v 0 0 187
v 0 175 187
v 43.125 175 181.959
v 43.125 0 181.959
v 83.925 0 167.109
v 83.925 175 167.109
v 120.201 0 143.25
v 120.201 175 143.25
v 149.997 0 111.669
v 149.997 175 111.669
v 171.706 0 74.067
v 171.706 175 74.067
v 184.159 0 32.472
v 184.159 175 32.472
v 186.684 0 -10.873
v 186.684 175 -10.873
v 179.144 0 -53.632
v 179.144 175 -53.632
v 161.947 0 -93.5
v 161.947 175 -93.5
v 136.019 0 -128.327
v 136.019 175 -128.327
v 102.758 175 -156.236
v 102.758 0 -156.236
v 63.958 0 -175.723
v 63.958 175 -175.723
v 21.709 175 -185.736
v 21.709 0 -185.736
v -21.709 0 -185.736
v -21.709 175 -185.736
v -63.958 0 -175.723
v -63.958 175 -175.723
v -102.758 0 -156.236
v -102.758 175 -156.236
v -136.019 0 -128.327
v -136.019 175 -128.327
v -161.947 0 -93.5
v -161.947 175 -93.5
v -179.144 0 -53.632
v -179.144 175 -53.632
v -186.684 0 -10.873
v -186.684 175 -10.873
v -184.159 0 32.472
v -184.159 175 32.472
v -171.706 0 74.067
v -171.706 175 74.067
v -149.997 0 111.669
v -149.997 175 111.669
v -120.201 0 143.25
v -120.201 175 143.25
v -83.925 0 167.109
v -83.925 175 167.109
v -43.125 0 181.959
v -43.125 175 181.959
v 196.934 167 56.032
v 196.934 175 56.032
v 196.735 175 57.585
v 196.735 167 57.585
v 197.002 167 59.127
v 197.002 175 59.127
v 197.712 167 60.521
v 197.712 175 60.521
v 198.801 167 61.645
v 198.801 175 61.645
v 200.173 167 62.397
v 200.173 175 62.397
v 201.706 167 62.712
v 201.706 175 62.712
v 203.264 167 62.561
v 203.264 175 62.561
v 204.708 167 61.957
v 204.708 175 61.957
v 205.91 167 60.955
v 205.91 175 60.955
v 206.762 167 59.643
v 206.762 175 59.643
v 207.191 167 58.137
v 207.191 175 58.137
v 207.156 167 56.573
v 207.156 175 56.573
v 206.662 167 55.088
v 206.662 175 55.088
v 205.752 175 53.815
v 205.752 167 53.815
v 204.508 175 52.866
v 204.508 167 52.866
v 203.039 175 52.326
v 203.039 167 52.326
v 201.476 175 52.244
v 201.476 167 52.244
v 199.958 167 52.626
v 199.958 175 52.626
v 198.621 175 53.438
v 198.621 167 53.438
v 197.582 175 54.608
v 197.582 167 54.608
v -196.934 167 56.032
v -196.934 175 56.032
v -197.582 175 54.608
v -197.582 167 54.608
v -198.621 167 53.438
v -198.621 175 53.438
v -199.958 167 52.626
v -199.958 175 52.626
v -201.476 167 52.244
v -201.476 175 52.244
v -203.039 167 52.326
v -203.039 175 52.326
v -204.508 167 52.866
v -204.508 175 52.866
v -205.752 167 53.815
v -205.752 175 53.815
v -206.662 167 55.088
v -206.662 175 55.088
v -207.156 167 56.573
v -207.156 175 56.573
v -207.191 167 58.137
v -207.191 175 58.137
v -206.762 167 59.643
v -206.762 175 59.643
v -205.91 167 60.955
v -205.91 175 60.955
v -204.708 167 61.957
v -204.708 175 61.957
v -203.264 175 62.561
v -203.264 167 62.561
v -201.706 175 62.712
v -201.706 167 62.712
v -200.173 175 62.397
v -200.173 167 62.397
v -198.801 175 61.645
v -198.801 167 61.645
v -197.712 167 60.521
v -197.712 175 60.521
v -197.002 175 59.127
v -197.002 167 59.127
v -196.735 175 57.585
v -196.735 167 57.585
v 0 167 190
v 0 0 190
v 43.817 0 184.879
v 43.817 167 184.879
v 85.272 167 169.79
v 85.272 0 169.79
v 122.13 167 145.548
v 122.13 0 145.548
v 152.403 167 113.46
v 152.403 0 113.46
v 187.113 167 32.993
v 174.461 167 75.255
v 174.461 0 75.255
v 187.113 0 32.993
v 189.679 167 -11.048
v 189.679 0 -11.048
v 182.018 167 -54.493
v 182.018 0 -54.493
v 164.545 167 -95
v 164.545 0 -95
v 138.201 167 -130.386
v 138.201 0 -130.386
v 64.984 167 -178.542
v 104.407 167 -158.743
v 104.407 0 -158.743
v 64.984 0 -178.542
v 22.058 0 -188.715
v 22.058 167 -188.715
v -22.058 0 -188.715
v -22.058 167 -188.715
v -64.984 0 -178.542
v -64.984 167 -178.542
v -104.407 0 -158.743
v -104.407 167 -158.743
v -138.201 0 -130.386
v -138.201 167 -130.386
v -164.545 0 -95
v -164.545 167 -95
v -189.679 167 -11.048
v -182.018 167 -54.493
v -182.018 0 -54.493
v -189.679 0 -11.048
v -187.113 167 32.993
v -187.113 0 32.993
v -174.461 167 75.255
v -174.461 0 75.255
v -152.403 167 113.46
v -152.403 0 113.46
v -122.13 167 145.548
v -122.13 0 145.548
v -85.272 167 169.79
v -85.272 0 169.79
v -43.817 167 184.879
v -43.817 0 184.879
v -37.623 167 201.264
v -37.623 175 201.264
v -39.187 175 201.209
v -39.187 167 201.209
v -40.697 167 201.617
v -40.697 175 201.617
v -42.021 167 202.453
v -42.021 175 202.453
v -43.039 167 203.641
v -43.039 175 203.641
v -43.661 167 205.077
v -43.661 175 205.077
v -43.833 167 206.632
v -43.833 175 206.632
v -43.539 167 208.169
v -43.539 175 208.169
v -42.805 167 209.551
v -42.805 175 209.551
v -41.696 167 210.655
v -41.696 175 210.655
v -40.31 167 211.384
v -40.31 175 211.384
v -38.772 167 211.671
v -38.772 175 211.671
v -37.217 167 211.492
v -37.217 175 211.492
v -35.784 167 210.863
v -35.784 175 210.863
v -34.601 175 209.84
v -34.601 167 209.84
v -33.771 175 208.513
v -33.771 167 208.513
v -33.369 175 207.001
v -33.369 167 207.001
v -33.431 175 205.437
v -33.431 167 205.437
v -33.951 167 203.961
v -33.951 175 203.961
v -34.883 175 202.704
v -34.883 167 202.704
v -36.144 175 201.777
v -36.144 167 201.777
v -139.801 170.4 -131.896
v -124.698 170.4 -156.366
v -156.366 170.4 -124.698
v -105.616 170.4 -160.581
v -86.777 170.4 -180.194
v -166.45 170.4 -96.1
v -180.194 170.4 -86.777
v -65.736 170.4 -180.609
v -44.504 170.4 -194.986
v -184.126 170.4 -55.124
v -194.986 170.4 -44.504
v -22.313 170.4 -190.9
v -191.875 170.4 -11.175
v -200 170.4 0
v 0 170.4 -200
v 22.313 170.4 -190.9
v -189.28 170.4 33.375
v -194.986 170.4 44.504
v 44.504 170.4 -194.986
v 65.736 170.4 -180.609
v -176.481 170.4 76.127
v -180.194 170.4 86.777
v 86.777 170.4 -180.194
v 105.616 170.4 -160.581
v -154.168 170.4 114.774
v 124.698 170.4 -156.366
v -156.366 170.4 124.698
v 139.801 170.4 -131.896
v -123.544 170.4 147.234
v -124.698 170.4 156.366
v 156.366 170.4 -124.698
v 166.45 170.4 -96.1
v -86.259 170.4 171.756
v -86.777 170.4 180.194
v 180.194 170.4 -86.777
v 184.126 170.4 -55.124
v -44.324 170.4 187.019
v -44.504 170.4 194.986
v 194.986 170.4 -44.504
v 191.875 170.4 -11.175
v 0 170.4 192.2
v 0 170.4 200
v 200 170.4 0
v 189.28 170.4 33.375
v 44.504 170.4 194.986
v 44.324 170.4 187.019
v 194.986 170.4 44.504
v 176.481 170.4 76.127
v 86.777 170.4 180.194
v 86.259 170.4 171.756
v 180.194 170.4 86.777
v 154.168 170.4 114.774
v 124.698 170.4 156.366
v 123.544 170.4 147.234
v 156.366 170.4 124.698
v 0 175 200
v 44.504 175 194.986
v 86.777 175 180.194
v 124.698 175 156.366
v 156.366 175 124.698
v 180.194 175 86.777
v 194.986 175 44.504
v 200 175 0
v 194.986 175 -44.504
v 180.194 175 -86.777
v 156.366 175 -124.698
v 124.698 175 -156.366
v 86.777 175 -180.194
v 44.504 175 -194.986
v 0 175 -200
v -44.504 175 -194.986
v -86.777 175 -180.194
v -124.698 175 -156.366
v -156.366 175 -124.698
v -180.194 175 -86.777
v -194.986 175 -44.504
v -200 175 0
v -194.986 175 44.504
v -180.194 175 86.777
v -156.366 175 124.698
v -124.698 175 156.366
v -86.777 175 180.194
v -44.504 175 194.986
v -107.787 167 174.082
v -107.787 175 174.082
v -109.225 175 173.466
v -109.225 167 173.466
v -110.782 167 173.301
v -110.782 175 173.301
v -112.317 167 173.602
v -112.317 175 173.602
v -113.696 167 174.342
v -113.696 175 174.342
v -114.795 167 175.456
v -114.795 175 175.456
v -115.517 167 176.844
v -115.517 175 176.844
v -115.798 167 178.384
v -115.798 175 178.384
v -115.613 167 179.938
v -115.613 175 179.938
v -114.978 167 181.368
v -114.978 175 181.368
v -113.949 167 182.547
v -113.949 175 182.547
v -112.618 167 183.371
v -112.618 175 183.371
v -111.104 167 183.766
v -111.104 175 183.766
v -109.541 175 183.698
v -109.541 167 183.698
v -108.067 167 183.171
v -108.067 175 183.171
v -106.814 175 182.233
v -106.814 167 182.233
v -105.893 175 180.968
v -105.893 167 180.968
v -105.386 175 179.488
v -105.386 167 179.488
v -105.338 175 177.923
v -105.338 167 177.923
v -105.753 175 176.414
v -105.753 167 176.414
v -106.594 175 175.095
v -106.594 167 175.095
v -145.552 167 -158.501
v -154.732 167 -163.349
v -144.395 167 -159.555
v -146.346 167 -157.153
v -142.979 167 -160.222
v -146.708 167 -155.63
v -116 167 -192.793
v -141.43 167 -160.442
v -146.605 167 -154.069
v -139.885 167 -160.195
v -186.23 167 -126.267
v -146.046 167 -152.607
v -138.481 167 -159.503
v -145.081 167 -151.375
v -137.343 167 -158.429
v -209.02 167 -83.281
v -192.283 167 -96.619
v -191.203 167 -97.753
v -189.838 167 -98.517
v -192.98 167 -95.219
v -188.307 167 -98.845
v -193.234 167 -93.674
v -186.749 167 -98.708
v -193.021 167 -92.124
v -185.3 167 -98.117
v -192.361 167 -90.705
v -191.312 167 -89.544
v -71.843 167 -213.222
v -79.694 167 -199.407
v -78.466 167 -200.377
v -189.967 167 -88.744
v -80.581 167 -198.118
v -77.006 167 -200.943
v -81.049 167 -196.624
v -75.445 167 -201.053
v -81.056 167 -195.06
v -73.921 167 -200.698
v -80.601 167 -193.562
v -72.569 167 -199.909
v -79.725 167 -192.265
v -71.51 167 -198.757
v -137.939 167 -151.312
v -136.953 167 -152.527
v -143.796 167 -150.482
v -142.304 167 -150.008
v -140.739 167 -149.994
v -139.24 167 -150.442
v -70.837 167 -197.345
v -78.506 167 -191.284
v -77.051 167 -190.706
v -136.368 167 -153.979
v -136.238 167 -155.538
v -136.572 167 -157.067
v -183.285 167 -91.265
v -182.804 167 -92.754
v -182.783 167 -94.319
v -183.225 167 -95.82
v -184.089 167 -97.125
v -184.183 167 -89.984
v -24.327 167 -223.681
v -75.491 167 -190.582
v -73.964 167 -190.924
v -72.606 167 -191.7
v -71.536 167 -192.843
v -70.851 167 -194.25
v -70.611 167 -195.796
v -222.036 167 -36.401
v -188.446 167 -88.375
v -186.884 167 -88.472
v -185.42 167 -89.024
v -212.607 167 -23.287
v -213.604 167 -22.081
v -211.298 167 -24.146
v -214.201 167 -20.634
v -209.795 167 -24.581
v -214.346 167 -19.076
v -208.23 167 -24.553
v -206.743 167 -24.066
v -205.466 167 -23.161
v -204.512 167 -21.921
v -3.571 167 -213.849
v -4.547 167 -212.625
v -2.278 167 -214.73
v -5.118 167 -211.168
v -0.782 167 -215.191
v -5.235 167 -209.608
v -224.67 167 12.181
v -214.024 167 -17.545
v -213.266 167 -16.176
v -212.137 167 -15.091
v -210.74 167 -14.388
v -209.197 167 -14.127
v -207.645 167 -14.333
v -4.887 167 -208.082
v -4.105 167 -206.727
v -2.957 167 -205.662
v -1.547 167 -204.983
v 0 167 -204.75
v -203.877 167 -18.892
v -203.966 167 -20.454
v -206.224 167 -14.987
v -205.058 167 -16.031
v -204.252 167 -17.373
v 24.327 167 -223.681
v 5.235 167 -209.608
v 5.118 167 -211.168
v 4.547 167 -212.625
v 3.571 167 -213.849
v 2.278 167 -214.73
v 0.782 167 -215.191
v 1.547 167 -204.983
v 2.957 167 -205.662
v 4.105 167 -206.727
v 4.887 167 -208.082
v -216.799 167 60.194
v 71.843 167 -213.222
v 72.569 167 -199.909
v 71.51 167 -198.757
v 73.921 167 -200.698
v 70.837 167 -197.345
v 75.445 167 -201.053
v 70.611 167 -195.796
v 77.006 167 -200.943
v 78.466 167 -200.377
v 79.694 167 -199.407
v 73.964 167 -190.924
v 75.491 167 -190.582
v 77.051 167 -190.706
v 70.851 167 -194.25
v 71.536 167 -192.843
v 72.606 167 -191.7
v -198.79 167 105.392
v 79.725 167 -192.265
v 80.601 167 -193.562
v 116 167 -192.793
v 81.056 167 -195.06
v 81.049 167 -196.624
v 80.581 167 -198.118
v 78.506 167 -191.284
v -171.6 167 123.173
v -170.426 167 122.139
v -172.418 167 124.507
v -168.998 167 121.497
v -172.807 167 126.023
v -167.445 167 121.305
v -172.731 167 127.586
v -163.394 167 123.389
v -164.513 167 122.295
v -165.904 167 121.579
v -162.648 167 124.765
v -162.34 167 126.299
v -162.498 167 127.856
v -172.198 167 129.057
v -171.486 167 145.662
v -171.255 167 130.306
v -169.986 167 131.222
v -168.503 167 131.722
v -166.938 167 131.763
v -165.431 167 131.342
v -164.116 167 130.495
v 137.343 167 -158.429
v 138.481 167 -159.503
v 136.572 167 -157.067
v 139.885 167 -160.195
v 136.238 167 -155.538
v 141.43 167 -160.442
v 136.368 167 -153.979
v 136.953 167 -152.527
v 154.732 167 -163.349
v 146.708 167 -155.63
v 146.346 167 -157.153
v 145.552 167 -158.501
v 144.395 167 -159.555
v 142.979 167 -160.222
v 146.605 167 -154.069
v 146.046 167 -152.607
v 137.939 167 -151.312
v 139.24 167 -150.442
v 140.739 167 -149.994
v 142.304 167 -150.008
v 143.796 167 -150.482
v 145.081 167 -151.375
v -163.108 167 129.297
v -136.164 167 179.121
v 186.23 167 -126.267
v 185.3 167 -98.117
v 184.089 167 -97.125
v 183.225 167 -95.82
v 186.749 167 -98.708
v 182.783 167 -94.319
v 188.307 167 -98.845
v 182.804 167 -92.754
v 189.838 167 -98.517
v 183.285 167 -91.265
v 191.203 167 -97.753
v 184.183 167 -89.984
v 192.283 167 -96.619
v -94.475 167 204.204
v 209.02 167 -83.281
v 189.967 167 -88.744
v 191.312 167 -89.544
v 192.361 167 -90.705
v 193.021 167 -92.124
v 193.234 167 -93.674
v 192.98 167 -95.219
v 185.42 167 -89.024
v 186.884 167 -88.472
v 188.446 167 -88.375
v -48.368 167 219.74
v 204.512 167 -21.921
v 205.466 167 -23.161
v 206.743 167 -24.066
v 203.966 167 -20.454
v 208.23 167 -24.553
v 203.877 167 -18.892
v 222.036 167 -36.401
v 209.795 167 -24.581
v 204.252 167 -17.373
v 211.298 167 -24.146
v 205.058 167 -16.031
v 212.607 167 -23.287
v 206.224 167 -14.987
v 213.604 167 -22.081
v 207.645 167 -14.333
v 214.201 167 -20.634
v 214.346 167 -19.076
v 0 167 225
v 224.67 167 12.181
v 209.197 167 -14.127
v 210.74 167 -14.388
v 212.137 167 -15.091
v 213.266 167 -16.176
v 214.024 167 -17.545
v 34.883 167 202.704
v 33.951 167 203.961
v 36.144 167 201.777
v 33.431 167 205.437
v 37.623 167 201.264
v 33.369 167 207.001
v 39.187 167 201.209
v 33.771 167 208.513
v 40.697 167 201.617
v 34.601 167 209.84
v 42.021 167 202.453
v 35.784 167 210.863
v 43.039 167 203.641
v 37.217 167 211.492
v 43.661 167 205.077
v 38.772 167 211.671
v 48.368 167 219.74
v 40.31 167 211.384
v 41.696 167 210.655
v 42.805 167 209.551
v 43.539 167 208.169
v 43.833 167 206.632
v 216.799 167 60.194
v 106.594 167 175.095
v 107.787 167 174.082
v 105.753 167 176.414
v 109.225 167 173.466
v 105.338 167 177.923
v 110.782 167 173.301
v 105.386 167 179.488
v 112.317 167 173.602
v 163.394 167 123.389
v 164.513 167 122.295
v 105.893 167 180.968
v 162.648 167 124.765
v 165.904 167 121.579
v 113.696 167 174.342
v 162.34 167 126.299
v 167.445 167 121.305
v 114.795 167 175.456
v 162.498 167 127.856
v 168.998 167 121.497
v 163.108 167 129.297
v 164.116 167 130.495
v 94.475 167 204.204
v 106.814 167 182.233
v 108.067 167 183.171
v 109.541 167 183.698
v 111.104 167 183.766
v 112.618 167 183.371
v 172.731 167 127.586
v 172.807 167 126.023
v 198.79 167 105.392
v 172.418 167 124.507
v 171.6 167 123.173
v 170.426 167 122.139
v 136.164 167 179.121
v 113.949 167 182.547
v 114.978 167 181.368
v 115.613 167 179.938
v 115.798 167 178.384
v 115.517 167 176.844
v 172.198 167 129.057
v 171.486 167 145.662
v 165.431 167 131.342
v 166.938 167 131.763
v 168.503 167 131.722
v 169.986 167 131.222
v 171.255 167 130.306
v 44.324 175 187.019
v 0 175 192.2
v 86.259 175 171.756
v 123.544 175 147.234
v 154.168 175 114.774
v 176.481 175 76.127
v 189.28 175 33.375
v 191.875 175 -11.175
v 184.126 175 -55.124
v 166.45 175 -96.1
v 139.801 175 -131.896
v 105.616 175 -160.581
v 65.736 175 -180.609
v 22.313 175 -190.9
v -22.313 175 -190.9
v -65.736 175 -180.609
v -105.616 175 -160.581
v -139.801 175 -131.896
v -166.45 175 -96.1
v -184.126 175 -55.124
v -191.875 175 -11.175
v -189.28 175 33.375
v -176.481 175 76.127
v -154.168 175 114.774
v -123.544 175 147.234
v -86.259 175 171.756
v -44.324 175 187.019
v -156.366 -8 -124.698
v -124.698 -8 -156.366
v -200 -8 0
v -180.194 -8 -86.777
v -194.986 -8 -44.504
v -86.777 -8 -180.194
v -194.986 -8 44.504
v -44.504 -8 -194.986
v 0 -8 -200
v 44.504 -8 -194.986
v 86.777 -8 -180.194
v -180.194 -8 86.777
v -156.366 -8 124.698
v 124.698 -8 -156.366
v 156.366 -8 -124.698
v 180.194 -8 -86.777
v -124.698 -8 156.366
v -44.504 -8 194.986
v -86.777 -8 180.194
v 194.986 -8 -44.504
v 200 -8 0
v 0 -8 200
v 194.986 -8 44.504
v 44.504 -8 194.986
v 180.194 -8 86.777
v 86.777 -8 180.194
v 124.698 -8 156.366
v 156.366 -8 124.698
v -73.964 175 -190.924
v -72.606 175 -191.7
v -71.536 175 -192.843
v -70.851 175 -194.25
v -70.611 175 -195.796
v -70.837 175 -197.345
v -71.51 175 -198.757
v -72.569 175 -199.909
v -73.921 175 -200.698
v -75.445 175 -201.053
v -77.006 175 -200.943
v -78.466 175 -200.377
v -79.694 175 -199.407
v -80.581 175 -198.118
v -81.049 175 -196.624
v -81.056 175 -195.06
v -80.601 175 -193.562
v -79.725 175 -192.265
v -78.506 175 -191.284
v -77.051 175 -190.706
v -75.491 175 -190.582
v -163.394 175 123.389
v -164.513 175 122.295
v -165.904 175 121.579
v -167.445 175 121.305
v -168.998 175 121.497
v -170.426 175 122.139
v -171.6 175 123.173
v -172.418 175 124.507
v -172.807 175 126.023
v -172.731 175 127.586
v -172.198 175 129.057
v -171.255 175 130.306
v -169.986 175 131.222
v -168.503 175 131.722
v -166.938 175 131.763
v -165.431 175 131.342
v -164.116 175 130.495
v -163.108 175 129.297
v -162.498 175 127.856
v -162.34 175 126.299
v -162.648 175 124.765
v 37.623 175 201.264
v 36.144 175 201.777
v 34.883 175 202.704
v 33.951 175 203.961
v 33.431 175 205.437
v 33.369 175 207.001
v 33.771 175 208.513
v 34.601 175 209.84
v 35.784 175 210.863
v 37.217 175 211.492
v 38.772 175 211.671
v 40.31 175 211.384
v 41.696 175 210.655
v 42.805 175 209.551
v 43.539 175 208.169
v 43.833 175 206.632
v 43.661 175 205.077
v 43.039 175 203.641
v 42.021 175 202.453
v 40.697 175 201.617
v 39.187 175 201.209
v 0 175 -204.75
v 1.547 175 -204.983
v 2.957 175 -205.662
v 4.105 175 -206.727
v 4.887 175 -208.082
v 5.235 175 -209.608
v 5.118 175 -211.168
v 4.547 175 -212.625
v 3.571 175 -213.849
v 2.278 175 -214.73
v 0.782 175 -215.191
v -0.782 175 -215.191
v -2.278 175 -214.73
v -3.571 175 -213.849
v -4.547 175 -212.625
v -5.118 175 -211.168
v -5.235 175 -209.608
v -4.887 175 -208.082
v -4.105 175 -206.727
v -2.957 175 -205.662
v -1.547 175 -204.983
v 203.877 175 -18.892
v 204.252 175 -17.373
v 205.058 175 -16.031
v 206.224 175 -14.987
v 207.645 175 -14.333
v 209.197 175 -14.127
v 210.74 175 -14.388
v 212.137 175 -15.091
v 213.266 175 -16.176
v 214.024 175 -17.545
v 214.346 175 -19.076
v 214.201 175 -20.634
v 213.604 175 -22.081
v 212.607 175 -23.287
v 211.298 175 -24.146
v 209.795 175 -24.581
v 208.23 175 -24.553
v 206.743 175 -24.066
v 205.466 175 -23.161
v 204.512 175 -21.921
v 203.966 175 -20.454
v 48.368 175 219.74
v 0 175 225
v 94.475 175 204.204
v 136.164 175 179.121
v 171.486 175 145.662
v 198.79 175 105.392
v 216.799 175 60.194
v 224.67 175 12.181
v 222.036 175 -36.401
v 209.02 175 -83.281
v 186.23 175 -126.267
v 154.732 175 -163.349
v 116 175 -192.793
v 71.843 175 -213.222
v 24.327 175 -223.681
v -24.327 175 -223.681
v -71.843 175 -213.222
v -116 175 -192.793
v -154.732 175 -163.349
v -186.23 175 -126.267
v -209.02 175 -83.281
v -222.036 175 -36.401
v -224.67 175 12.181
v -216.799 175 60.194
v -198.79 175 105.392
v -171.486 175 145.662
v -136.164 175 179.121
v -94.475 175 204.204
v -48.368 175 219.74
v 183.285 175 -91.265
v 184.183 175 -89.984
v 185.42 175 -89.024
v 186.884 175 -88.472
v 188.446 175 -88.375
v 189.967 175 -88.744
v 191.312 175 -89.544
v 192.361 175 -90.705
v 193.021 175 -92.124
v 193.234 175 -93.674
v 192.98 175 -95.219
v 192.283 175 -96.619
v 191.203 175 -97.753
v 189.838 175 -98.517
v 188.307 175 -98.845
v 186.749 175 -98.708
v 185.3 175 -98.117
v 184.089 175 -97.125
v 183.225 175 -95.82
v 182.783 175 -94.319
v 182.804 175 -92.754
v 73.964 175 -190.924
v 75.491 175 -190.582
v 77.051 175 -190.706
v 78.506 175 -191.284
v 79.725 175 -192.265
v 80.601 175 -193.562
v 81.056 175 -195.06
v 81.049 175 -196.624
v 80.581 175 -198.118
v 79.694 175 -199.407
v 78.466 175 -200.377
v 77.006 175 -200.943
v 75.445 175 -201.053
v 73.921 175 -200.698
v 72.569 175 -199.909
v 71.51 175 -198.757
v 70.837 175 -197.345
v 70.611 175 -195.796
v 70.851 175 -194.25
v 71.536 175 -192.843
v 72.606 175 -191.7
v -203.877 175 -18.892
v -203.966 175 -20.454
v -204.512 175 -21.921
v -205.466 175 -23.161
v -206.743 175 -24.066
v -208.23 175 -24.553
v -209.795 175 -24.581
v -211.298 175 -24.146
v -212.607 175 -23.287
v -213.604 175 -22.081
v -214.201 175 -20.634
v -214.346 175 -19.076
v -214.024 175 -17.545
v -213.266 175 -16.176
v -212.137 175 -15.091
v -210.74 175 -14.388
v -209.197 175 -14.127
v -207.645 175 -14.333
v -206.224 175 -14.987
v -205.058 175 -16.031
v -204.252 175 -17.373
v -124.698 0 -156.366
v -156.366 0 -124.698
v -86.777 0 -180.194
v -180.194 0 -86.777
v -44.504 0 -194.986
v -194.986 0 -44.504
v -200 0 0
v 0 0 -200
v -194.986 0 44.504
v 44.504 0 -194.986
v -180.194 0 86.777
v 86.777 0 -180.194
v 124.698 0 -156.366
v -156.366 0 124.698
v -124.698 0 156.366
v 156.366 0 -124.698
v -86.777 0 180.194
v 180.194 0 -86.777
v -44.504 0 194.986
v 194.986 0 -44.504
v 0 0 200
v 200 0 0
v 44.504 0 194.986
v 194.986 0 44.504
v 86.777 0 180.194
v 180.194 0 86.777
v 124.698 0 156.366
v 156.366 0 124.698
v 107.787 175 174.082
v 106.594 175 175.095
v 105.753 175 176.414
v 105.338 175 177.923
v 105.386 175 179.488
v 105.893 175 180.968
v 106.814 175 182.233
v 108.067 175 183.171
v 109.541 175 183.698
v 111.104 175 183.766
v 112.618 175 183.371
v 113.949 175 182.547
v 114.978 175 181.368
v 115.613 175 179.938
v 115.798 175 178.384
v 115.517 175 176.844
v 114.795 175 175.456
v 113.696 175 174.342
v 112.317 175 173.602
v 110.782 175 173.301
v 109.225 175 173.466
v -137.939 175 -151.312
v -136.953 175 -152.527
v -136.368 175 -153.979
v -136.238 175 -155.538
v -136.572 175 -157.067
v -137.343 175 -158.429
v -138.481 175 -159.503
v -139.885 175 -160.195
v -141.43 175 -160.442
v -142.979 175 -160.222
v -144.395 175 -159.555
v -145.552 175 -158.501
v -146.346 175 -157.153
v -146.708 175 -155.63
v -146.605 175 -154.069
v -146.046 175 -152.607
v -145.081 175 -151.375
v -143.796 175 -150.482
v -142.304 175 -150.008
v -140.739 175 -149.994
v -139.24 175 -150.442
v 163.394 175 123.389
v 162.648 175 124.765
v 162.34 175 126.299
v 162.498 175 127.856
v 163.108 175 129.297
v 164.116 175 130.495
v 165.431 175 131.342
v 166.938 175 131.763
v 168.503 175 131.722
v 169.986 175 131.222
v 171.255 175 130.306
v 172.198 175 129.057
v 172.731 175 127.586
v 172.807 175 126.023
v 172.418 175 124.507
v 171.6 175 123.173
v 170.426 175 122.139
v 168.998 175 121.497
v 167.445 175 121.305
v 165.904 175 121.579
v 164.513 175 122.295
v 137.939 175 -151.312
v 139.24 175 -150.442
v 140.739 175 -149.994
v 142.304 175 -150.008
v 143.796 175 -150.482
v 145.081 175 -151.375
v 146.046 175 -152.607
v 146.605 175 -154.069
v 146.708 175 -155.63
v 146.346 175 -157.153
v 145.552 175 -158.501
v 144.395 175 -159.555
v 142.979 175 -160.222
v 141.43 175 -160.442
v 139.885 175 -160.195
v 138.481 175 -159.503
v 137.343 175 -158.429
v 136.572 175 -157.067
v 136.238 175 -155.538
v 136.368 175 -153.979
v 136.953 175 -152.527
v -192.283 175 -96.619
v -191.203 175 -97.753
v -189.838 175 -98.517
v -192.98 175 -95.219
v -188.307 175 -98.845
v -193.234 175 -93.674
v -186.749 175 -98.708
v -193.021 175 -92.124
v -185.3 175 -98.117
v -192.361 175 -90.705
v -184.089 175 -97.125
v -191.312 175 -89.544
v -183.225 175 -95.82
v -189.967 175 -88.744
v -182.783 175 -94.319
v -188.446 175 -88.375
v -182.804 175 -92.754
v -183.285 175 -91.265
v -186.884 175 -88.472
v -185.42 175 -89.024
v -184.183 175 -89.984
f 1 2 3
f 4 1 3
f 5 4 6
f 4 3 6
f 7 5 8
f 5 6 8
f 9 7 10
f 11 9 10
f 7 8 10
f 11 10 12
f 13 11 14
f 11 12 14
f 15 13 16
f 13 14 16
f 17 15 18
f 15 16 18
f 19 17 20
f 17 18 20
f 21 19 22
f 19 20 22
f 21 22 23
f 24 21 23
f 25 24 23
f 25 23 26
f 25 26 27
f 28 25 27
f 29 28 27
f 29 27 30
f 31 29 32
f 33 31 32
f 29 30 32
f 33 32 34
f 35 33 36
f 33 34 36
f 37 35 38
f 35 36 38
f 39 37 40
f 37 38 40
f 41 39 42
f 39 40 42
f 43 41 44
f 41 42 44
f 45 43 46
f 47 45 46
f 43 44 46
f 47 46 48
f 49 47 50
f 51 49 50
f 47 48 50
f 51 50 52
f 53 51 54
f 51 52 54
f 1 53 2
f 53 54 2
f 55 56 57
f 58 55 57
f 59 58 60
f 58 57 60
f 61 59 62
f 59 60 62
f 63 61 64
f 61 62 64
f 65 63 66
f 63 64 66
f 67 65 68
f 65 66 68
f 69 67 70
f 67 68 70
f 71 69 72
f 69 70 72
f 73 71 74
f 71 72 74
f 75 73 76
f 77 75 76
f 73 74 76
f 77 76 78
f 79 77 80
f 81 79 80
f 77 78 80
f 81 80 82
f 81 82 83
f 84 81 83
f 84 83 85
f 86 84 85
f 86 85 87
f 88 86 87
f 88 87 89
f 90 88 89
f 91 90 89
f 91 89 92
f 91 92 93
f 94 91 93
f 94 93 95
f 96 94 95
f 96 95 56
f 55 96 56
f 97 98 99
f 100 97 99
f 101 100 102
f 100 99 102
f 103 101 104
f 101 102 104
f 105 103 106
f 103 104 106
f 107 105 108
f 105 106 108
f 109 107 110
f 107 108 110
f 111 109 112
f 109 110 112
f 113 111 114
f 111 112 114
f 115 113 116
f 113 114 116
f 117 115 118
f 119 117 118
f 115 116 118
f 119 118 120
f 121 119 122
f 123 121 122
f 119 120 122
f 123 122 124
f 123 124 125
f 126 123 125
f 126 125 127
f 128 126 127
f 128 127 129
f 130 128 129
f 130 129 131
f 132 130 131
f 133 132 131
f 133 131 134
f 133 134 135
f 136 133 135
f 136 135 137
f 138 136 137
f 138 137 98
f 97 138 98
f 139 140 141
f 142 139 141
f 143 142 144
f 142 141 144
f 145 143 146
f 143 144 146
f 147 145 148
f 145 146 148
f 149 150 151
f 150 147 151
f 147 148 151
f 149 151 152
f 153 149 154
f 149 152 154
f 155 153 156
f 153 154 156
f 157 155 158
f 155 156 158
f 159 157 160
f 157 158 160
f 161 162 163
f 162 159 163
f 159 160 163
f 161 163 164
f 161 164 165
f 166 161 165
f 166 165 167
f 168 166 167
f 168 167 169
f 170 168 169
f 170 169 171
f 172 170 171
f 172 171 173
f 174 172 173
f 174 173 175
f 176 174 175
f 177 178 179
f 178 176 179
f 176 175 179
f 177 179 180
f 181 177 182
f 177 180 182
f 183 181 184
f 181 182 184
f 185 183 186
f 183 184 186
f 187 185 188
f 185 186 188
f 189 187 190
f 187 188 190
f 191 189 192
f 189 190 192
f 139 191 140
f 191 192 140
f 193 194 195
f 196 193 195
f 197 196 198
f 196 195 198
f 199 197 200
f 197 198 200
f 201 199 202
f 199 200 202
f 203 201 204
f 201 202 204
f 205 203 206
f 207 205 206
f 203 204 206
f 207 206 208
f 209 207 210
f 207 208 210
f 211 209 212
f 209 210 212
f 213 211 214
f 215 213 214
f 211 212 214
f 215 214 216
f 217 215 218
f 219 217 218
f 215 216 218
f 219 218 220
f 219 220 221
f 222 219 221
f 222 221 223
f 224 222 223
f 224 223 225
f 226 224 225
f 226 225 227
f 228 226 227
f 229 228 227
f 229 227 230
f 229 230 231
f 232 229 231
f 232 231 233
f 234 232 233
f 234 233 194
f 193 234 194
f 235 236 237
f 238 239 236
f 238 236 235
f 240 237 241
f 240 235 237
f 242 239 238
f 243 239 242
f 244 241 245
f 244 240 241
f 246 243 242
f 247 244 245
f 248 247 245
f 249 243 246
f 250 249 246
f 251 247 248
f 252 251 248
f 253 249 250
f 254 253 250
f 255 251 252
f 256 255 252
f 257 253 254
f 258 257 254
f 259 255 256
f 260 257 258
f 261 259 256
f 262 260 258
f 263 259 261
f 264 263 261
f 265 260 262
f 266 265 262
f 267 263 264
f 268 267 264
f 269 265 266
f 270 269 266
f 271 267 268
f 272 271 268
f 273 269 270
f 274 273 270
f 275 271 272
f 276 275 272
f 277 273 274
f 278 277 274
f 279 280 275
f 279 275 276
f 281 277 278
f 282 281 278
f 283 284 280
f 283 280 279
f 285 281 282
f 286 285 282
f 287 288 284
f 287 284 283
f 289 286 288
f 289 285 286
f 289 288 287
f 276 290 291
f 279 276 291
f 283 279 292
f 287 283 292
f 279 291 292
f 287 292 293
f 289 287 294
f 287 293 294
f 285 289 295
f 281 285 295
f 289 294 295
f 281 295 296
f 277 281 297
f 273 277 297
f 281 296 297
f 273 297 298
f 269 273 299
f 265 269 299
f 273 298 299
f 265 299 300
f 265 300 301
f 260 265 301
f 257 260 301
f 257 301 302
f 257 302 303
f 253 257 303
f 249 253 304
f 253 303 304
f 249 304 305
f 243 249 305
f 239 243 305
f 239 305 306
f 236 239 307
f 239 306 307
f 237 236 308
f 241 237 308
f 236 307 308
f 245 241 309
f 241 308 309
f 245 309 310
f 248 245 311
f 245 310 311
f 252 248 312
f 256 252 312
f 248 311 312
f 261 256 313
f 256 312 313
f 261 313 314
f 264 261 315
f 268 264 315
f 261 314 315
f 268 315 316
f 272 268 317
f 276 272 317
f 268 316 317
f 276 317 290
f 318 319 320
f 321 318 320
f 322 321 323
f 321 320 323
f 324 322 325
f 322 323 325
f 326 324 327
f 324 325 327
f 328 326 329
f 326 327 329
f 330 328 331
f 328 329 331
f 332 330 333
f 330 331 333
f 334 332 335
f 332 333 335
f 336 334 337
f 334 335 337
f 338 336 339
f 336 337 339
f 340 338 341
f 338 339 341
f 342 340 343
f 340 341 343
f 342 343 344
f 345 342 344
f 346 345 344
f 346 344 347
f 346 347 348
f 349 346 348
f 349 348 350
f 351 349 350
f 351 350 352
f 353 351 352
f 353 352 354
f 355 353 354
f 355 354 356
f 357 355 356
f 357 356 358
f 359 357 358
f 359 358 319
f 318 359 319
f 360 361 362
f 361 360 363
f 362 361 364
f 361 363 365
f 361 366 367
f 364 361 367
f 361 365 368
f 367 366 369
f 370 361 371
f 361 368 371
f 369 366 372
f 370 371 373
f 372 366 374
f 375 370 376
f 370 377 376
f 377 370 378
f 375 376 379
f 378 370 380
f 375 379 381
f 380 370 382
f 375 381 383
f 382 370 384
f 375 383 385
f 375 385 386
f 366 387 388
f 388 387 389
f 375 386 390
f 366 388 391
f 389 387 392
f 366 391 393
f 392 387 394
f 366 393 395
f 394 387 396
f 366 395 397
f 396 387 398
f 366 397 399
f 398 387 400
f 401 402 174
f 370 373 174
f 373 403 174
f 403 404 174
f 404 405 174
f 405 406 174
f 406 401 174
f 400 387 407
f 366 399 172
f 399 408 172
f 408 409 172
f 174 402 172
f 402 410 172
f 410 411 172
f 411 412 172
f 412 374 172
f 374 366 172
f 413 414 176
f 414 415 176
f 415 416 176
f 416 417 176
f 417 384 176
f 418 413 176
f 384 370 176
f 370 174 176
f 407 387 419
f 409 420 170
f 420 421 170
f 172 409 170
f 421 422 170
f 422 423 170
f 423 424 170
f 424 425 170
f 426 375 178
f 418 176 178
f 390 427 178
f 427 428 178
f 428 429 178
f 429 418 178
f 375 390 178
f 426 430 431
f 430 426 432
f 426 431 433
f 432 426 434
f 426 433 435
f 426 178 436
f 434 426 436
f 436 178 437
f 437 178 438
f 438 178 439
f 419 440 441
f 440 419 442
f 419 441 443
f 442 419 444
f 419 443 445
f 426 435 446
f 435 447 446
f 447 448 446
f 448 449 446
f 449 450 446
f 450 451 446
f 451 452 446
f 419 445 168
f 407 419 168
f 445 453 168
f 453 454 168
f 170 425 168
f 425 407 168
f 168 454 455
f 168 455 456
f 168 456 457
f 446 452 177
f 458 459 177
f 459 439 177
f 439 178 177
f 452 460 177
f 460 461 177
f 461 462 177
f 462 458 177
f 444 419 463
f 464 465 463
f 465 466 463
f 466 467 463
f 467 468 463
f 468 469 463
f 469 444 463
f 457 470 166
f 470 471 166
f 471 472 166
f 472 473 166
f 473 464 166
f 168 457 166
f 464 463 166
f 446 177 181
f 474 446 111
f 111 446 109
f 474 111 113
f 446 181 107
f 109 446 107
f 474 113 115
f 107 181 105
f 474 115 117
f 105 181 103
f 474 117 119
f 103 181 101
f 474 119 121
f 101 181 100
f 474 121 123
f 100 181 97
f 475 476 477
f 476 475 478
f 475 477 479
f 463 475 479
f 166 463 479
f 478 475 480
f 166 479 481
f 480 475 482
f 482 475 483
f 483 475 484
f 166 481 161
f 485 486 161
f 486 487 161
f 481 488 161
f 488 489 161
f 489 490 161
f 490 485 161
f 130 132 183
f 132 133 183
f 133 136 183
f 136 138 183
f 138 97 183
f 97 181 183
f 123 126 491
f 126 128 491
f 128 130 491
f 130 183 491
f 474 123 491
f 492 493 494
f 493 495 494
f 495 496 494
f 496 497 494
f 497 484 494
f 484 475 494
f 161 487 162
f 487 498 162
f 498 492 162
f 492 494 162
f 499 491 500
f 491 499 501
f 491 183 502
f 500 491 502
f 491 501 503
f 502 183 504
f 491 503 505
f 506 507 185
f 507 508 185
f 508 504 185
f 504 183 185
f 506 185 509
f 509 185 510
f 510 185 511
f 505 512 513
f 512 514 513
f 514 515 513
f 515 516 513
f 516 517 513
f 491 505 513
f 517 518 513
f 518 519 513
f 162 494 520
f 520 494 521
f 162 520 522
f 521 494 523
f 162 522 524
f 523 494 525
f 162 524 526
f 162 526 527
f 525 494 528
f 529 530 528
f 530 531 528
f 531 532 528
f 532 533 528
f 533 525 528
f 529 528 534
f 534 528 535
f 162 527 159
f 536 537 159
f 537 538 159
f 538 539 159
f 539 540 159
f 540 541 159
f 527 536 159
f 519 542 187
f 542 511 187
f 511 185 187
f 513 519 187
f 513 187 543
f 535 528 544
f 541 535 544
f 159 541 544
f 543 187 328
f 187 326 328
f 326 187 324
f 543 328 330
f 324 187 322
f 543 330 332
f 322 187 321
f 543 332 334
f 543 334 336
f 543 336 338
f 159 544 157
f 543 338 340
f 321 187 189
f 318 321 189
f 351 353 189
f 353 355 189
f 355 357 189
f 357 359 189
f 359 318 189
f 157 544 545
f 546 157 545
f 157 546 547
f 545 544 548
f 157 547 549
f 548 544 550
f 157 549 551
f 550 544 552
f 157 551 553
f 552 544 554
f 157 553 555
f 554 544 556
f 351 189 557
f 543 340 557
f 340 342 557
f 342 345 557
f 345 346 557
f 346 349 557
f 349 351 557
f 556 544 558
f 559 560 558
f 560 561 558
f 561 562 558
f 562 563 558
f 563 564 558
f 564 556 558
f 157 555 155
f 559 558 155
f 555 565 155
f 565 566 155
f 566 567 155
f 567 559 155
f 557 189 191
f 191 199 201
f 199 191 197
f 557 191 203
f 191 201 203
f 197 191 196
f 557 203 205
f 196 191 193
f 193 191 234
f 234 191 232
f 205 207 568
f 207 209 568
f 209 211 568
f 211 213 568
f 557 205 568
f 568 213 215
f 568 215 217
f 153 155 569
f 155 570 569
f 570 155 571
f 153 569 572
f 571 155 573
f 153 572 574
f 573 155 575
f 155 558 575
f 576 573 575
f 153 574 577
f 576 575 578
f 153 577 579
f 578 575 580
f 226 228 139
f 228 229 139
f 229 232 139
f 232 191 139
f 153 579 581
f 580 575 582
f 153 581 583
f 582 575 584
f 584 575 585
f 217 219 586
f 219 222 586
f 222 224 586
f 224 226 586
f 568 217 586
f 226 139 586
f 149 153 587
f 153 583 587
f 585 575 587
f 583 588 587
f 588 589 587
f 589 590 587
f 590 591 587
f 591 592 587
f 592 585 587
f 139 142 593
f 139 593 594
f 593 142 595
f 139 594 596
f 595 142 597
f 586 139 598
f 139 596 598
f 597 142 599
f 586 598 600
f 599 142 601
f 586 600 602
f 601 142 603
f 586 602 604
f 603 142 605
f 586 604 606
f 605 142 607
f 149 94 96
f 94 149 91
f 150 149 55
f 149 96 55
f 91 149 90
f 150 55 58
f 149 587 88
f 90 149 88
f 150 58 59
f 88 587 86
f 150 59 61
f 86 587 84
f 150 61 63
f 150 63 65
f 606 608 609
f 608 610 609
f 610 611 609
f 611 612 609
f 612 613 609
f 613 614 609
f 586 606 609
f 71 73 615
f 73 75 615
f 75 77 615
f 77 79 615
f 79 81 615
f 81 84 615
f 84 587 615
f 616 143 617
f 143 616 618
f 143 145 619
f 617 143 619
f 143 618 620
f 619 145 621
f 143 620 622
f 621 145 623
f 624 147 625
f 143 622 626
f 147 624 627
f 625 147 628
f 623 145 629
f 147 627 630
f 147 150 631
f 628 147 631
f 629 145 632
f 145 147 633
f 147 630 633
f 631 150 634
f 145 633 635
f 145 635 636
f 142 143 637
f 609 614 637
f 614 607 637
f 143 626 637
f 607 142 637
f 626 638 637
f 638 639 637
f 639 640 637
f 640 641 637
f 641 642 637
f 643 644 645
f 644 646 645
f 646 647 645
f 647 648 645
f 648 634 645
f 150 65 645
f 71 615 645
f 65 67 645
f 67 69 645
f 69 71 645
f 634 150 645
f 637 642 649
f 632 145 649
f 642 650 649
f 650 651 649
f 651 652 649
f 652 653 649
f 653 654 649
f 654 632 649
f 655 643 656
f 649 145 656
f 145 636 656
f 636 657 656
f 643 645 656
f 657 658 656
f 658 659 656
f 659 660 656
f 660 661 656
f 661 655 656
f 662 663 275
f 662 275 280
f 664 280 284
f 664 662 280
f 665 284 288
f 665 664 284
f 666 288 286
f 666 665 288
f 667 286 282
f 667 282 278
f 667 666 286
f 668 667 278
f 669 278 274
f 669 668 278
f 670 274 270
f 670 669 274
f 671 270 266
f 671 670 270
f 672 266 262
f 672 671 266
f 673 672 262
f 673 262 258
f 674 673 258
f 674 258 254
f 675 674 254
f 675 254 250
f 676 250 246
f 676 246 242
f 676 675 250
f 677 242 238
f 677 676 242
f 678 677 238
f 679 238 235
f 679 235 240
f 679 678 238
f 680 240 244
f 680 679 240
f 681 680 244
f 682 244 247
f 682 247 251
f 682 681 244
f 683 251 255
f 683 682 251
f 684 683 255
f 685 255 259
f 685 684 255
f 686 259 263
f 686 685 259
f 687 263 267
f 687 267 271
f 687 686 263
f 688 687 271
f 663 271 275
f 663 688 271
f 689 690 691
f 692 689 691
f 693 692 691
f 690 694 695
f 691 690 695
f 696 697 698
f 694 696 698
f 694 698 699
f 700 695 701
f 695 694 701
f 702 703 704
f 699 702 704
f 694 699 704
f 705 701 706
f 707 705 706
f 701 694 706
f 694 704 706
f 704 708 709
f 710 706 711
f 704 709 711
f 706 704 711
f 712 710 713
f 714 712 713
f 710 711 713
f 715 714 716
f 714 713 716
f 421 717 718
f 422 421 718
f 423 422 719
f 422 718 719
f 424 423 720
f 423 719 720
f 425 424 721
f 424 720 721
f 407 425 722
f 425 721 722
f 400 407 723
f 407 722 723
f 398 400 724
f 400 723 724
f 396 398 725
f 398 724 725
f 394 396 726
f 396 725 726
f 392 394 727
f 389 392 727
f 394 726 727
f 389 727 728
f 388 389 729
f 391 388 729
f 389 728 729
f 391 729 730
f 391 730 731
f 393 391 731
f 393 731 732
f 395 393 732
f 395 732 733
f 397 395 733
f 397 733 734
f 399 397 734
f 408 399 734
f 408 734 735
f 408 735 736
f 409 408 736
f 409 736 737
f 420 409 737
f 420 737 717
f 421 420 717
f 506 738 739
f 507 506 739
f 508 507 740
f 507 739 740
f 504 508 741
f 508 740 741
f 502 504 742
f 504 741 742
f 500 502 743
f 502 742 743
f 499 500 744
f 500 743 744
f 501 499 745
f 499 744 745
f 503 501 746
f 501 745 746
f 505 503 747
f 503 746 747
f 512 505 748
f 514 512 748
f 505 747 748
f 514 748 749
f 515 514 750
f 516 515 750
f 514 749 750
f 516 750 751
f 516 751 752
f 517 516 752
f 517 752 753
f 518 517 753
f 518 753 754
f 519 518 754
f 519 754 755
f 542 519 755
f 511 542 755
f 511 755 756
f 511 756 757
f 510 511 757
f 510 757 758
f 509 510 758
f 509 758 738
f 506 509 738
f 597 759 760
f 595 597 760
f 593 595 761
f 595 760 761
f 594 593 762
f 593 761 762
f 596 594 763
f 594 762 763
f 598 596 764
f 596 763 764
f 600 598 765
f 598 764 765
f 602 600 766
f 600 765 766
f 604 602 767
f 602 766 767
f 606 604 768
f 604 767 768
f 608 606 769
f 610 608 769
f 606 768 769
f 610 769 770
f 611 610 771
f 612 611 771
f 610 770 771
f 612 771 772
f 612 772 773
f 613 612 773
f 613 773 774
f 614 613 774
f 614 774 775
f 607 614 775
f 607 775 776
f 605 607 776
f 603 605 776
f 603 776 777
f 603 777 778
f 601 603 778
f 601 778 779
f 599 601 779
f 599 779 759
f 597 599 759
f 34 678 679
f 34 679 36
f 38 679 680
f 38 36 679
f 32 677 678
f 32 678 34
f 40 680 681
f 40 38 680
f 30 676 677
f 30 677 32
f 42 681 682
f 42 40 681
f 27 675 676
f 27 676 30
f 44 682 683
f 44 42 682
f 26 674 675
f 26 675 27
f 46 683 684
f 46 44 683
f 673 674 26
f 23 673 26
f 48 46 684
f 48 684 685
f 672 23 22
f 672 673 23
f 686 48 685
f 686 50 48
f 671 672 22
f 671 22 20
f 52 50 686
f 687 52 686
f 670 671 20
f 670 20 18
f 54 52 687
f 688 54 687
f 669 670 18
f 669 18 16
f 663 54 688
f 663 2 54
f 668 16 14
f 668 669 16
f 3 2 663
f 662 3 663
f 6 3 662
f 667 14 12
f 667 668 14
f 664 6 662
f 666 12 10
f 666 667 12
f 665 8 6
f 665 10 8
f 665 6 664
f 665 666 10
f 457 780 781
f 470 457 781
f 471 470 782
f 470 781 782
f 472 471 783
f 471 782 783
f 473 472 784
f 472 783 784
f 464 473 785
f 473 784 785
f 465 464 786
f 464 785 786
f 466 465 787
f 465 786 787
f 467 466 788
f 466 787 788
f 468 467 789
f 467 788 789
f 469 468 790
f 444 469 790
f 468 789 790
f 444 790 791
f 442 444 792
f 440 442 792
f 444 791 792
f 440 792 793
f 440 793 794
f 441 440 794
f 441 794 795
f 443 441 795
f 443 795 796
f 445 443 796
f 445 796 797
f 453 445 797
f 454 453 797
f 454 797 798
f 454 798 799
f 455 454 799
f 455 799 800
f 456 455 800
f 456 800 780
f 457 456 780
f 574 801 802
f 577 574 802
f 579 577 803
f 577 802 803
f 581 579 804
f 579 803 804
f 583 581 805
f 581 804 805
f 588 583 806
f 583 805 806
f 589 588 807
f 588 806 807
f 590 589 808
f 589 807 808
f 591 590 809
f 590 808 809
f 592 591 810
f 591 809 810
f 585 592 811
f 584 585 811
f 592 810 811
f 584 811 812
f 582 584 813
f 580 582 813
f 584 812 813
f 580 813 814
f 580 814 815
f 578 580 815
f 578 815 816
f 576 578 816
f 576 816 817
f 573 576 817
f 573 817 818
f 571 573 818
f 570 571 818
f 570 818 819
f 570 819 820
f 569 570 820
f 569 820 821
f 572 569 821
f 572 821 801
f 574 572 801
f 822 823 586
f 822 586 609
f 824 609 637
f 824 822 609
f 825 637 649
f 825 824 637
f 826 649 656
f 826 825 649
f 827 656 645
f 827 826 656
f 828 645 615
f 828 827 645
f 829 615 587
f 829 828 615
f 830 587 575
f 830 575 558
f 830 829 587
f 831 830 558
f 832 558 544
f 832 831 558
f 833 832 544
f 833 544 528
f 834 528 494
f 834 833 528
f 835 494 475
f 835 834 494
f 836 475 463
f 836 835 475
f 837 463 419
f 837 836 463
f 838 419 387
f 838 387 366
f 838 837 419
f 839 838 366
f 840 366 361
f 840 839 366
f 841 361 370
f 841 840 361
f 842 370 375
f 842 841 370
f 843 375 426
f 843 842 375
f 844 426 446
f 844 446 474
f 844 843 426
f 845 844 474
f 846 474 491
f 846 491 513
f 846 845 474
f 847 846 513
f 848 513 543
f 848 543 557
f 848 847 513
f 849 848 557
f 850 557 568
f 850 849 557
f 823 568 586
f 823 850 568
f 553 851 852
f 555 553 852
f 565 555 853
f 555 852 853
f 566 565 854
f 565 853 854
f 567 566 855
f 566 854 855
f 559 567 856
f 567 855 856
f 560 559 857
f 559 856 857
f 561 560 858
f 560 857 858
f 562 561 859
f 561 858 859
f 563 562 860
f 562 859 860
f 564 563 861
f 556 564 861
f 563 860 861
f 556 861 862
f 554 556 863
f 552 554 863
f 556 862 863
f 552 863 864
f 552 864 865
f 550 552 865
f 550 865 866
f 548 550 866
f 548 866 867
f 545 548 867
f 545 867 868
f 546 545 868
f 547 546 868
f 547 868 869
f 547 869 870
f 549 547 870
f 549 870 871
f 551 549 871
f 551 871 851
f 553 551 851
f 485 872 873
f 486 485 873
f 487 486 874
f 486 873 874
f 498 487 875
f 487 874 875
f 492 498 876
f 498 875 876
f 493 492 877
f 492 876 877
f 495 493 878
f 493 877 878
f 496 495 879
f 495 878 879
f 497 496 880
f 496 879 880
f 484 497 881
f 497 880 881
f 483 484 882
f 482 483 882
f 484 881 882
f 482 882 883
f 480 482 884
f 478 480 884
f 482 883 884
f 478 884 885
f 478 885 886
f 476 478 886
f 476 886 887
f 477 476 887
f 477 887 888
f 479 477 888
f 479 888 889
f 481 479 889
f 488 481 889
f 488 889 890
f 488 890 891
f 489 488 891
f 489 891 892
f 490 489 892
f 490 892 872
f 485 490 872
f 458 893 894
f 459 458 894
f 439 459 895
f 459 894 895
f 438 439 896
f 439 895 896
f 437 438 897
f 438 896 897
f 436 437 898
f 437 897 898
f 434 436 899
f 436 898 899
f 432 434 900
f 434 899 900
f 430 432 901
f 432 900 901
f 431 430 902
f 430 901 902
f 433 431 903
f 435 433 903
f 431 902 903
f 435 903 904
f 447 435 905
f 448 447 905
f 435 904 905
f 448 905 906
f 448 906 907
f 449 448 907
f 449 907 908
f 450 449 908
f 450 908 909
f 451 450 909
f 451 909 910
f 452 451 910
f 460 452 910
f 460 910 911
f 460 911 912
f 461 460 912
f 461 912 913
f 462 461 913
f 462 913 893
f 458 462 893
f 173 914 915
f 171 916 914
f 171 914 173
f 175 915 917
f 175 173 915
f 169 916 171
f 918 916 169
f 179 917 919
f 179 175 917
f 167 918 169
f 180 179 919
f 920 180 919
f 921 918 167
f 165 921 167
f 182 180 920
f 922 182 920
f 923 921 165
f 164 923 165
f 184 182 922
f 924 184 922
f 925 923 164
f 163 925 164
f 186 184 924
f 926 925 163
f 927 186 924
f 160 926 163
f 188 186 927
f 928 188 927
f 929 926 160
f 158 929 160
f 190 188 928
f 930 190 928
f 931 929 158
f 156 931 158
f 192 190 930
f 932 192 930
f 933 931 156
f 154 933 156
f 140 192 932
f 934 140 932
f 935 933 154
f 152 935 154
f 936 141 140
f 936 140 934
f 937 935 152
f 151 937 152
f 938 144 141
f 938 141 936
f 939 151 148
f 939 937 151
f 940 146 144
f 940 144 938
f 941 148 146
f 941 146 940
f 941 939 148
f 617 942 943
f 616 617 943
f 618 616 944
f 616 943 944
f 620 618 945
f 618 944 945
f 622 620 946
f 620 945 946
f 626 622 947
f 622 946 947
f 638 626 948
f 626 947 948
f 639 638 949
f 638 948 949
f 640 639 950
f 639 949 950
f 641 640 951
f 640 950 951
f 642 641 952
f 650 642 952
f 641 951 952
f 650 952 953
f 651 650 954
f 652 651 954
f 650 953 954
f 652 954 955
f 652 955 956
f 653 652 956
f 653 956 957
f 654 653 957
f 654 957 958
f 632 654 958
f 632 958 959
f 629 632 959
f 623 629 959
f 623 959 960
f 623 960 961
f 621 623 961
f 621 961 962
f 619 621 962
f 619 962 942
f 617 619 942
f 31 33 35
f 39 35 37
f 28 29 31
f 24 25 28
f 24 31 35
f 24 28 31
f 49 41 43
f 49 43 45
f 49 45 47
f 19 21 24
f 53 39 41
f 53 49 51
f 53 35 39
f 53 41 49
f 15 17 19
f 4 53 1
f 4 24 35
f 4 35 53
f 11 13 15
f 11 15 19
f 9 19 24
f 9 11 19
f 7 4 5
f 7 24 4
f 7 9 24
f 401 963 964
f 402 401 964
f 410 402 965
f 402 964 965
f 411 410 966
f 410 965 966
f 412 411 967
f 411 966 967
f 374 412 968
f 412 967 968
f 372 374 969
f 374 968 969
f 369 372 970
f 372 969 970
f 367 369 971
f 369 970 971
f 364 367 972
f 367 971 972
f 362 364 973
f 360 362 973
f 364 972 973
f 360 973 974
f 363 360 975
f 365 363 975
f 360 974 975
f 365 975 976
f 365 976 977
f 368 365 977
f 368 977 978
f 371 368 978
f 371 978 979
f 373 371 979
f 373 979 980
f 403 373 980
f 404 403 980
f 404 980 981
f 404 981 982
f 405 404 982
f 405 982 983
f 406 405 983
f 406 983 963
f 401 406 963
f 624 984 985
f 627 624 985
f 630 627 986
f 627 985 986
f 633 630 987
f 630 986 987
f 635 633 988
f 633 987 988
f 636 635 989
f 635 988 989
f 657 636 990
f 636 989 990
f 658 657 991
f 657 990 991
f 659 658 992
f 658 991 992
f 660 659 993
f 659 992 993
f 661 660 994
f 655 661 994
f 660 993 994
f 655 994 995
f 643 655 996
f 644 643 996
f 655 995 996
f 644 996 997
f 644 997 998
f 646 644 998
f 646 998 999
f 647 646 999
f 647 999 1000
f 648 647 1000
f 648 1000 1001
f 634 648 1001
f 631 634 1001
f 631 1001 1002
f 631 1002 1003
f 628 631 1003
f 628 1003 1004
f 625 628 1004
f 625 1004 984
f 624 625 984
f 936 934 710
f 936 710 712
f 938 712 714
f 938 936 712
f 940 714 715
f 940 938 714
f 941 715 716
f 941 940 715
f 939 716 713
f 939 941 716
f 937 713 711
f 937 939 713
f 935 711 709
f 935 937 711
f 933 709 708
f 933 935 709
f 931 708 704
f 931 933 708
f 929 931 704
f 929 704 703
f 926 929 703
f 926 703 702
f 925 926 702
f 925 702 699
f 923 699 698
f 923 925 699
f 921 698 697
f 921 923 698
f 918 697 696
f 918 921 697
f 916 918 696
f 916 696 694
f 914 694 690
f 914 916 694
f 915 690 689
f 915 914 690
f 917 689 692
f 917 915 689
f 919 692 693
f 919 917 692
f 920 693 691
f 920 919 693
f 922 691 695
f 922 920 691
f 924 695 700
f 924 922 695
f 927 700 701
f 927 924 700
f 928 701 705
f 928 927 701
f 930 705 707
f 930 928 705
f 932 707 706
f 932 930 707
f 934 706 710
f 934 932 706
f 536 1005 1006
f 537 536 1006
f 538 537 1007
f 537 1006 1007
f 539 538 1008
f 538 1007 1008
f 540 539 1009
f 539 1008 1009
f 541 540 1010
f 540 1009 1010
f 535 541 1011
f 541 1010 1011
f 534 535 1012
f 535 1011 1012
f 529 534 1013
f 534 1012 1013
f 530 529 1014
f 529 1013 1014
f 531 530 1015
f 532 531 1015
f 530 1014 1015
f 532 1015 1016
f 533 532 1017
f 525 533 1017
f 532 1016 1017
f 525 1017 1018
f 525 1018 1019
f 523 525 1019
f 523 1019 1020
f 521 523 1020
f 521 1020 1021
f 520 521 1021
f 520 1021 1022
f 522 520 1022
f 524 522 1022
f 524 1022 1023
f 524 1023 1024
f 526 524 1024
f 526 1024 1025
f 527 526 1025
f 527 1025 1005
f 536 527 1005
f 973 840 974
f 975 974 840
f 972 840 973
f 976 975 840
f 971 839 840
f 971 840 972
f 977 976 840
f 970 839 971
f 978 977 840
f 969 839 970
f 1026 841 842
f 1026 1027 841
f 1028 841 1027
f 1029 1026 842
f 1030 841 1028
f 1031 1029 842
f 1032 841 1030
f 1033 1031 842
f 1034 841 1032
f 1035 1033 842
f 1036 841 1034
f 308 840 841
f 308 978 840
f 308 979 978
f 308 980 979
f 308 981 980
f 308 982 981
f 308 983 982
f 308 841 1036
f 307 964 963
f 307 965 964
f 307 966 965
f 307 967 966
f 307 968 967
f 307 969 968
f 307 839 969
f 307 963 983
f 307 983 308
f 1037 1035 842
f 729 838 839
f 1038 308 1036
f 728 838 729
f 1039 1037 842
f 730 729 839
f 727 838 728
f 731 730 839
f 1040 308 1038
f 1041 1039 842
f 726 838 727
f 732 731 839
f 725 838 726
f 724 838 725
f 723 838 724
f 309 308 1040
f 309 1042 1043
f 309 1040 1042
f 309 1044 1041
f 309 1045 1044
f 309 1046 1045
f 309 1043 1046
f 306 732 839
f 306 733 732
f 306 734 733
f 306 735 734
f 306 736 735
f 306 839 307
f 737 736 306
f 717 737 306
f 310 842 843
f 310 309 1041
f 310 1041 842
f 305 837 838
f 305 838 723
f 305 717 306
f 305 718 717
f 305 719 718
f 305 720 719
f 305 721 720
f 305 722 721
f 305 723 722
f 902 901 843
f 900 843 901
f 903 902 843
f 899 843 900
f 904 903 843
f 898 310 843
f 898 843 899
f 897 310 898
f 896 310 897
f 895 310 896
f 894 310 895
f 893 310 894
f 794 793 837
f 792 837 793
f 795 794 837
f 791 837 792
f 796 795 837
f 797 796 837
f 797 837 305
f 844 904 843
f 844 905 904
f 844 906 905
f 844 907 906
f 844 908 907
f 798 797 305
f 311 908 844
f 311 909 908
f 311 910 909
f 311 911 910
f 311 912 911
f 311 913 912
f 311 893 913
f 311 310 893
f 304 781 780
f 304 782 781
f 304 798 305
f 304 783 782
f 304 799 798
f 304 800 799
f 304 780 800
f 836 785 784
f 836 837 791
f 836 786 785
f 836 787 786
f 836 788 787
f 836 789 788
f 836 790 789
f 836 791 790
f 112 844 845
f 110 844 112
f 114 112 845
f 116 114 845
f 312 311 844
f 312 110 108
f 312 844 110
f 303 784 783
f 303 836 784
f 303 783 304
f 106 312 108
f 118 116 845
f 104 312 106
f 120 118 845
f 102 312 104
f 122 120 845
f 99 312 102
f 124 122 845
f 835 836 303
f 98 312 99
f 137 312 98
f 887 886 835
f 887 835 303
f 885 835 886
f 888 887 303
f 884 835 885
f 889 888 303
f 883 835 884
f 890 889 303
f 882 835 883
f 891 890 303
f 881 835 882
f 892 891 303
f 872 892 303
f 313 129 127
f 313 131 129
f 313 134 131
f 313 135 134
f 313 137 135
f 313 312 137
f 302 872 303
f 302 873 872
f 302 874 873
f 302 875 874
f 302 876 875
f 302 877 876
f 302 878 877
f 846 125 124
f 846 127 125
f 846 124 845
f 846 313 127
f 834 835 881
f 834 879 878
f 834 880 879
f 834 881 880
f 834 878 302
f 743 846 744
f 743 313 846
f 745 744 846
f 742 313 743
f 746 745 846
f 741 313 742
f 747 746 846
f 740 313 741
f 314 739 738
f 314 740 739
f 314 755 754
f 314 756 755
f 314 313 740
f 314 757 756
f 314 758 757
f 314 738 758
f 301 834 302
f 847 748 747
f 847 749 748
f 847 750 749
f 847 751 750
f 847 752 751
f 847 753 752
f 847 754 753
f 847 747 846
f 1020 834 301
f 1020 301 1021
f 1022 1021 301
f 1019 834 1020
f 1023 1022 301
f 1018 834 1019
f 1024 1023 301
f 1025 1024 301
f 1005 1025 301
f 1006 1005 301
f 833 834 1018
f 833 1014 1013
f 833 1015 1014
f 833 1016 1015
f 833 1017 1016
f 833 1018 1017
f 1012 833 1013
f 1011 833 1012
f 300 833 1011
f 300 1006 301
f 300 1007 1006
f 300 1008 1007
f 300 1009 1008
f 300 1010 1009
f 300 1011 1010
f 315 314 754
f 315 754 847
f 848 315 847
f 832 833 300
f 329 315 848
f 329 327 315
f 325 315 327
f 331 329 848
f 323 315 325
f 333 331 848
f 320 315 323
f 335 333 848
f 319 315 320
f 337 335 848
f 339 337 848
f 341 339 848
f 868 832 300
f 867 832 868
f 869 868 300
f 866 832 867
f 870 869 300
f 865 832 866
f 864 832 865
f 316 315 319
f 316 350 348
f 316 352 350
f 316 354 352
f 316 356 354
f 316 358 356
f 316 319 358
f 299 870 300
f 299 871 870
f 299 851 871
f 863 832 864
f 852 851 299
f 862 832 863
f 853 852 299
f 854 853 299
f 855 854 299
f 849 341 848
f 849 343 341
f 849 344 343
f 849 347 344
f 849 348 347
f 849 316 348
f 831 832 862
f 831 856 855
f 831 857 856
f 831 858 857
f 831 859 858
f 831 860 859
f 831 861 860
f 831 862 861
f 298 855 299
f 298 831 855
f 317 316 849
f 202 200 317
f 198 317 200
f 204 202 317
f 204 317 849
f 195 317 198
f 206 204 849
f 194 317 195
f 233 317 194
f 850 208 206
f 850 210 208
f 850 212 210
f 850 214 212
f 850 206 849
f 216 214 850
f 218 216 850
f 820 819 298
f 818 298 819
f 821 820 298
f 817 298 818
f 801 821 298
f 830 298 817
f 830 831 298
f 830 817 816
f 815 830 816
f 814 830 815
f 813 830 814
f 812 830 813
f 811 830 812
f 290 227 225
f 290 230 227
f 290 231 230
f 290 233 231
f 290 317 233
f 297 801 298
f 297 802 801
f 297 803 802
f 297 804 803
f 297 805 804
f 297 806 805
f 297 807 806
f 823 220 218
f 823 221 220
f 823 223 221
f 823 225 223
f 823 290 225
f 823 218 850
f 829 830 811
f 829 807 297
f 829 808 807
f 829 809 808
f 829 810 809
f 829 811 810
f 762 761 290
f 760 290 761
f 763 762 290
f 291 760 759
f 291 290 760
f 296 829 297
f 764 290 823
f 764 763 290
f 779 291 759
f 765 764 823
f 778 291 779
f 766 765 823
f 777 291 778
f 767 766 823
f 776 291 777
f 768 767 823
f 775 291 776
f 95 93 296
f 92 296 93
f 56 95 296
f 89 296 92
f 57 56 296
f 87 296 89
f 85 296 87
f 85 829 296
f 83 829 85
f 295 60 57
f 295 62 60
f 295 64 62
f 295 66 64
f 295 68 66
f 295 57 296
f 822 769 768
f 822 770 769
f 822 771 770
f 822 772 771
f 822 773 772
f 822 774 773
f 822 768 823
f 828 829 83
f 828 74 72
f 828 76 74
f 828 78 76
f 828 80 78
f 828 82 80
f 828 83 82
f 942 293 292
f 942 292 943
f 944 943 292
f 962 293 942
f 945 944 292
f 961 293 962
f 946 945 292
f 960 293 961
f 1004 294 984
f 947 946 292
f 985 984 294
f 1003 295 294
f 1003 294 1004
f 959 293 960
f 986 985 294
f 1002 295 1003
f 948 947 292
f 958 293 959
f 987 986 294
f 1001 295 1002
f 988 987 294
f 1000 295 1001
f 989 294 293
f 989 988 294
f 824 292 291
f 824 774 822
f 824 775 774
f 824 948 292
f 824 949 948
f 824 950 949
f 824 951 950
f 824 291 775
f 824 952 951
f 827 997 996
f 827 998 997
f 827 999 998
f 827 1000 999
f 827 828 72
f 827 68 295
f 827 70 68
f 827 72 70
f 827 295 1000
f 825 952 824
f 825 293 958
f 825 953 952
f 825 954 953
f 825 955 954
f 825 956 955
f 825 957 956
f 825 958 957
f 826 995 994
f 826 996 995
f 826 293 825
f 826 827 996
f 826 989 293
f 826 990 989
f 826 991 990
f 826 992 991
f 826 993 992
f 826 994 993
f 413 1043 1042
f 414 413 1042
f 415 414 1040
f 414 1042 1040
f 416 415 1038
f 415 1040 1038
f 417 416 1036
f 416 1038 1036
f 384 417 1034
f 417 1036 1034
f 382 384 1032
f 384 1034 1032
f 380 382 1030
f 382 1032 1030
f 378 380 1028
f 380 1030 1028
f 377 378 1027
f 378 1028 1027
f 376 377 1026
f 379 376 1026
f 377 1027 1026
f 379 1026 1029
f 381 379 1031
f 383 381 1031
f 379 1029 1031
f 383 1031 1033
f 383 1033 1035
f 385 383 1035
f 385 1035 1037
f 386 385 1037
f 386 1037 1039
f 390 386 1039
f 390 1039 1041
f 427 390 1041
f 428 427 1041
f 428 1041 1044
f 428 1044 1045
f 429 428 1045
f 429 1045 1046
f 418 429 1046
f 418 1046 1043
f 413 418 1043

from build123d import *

# Parameters (mm, degrees)
SKETCH1_R           = 200
BOSS_EXTRUDE1_DEPTH = 8
SKETCH2_R           = 190
BOSS_EXTRUDE2_DEPTH = 175
SKETCH3_R           = 225
BOSS_EXTRUDE3_DEPTH = 8
SKETCH4_R           = 187
CUT_EXTRUDE1_DEPTH  = 175
SKETCH5_R           = 200
SKETCH5_R_2         = 192.2
CUT_EXTRUDE2_DEPTH  = 4.6
SKETCH6_R           = 5.25
CUT_EXTRUDE3_DEPTH  = 10
CIRPATTERN1_COUNT   = 17


with BuildPart() as part:
    # Sketch1 → Boss-Extrude1 (new body)
    with BuildSketch(Plane(origin=(0, 0, 0), x_dir=(1, 0, 0), z_dir=(0, 1, 0))):
        with Locations(Location((0, 0, 0), (0, 0, 270))):
            Circle(SKETCH1_R)
    extrude(amount=-BOSS_EXTRUDE1_DEPTH)

    # Sketch2 → Boss-Extrude2 (add)
    with BuildSketch(Plane(origin=(0, 0, 0), x_dir=(1, 0, 0), z_dir=(0, 1, 0))):
        with Locations(Location((0, 0, 0), (0, 0, 270))):
            Circle(SKETCH2_R)
    extrude(amount=BOSS_EXTRUDE2_DEPTH)

    # Sketch3 → Boss-Extrude3 (add)
    with BuildSketch(Plane(origin=(0, 175, 0), x_dir=(1, 0, 0), z_dir=(0, 1, 0))):
        with Locations(Location((0, 0, 0), (0, 0, 270))):
            Circle(SKETCH3_R)
    extrude(amount=-BOSS_EXTRUDE3_DEPTH)

    # Sketch4 → Cut-Extrude1 (cut)
    with BuildSketch(Plane(origin=(0, 175, 0), x_dir=(1, 0, 0), z_dir=(0, 1, 0))):
        with Locations(Location((0, 0, 0), (0, 0, 270))):
            Circle(SKETCH4_R)
    extrude(amount=-CUT_EXTRUDE1_DEPTH, mode=Mode.SUBTRACT)

    # Sketch5 → Cut-Extrude2 (cut)
    with BuildSketch(Plane(origin=(0, 175, 0), x_dir=(1, 0, 0), z_dir=(0, 1, 0))):
        with Locations(Location((0, 0, 0), (0, 0, 270))):
            Circle(SKETCH5_R)
        with Locations(Location((0, 0, 0), (0, 0, 270))):
            Circle(SKETCH5_R_2, mode=Mode.SUBTRACT)
    extrude(amount=-CUT_EXTRUDE2_DEPTH, mode=Mode.SUBTRACT)

    # Sketch6 → Cut-Extrude3 (cut)
    with BuildSketch(Plane(origin=(0, 175, 0), x_dir=(1, 0, 0), z_dir=(0, 1, 0))):
        with Locations(Location((0, 210, 0), (0, 0, 270))):
            Circle(SKETCH6_R)
    cut_extrude3 = extrude(amount=-CUT_EXTRUDE3_DEPTH, mode=Mode.SUBTRACT)

    # CirPattern1: Cut-Extrude3 ×17 about axis
    cirpattern1_axis = Axis((0, 0, 0), (0, 1, 0))
    for i in range(1, CIRPATTERN1_COUNT):
        add(cut_extrude3.rotate(cirpattern1_axis, i * 360 / CIRPATTERN1_COUNT), mode=Mode.SUBTRACT)


solid = part.part
